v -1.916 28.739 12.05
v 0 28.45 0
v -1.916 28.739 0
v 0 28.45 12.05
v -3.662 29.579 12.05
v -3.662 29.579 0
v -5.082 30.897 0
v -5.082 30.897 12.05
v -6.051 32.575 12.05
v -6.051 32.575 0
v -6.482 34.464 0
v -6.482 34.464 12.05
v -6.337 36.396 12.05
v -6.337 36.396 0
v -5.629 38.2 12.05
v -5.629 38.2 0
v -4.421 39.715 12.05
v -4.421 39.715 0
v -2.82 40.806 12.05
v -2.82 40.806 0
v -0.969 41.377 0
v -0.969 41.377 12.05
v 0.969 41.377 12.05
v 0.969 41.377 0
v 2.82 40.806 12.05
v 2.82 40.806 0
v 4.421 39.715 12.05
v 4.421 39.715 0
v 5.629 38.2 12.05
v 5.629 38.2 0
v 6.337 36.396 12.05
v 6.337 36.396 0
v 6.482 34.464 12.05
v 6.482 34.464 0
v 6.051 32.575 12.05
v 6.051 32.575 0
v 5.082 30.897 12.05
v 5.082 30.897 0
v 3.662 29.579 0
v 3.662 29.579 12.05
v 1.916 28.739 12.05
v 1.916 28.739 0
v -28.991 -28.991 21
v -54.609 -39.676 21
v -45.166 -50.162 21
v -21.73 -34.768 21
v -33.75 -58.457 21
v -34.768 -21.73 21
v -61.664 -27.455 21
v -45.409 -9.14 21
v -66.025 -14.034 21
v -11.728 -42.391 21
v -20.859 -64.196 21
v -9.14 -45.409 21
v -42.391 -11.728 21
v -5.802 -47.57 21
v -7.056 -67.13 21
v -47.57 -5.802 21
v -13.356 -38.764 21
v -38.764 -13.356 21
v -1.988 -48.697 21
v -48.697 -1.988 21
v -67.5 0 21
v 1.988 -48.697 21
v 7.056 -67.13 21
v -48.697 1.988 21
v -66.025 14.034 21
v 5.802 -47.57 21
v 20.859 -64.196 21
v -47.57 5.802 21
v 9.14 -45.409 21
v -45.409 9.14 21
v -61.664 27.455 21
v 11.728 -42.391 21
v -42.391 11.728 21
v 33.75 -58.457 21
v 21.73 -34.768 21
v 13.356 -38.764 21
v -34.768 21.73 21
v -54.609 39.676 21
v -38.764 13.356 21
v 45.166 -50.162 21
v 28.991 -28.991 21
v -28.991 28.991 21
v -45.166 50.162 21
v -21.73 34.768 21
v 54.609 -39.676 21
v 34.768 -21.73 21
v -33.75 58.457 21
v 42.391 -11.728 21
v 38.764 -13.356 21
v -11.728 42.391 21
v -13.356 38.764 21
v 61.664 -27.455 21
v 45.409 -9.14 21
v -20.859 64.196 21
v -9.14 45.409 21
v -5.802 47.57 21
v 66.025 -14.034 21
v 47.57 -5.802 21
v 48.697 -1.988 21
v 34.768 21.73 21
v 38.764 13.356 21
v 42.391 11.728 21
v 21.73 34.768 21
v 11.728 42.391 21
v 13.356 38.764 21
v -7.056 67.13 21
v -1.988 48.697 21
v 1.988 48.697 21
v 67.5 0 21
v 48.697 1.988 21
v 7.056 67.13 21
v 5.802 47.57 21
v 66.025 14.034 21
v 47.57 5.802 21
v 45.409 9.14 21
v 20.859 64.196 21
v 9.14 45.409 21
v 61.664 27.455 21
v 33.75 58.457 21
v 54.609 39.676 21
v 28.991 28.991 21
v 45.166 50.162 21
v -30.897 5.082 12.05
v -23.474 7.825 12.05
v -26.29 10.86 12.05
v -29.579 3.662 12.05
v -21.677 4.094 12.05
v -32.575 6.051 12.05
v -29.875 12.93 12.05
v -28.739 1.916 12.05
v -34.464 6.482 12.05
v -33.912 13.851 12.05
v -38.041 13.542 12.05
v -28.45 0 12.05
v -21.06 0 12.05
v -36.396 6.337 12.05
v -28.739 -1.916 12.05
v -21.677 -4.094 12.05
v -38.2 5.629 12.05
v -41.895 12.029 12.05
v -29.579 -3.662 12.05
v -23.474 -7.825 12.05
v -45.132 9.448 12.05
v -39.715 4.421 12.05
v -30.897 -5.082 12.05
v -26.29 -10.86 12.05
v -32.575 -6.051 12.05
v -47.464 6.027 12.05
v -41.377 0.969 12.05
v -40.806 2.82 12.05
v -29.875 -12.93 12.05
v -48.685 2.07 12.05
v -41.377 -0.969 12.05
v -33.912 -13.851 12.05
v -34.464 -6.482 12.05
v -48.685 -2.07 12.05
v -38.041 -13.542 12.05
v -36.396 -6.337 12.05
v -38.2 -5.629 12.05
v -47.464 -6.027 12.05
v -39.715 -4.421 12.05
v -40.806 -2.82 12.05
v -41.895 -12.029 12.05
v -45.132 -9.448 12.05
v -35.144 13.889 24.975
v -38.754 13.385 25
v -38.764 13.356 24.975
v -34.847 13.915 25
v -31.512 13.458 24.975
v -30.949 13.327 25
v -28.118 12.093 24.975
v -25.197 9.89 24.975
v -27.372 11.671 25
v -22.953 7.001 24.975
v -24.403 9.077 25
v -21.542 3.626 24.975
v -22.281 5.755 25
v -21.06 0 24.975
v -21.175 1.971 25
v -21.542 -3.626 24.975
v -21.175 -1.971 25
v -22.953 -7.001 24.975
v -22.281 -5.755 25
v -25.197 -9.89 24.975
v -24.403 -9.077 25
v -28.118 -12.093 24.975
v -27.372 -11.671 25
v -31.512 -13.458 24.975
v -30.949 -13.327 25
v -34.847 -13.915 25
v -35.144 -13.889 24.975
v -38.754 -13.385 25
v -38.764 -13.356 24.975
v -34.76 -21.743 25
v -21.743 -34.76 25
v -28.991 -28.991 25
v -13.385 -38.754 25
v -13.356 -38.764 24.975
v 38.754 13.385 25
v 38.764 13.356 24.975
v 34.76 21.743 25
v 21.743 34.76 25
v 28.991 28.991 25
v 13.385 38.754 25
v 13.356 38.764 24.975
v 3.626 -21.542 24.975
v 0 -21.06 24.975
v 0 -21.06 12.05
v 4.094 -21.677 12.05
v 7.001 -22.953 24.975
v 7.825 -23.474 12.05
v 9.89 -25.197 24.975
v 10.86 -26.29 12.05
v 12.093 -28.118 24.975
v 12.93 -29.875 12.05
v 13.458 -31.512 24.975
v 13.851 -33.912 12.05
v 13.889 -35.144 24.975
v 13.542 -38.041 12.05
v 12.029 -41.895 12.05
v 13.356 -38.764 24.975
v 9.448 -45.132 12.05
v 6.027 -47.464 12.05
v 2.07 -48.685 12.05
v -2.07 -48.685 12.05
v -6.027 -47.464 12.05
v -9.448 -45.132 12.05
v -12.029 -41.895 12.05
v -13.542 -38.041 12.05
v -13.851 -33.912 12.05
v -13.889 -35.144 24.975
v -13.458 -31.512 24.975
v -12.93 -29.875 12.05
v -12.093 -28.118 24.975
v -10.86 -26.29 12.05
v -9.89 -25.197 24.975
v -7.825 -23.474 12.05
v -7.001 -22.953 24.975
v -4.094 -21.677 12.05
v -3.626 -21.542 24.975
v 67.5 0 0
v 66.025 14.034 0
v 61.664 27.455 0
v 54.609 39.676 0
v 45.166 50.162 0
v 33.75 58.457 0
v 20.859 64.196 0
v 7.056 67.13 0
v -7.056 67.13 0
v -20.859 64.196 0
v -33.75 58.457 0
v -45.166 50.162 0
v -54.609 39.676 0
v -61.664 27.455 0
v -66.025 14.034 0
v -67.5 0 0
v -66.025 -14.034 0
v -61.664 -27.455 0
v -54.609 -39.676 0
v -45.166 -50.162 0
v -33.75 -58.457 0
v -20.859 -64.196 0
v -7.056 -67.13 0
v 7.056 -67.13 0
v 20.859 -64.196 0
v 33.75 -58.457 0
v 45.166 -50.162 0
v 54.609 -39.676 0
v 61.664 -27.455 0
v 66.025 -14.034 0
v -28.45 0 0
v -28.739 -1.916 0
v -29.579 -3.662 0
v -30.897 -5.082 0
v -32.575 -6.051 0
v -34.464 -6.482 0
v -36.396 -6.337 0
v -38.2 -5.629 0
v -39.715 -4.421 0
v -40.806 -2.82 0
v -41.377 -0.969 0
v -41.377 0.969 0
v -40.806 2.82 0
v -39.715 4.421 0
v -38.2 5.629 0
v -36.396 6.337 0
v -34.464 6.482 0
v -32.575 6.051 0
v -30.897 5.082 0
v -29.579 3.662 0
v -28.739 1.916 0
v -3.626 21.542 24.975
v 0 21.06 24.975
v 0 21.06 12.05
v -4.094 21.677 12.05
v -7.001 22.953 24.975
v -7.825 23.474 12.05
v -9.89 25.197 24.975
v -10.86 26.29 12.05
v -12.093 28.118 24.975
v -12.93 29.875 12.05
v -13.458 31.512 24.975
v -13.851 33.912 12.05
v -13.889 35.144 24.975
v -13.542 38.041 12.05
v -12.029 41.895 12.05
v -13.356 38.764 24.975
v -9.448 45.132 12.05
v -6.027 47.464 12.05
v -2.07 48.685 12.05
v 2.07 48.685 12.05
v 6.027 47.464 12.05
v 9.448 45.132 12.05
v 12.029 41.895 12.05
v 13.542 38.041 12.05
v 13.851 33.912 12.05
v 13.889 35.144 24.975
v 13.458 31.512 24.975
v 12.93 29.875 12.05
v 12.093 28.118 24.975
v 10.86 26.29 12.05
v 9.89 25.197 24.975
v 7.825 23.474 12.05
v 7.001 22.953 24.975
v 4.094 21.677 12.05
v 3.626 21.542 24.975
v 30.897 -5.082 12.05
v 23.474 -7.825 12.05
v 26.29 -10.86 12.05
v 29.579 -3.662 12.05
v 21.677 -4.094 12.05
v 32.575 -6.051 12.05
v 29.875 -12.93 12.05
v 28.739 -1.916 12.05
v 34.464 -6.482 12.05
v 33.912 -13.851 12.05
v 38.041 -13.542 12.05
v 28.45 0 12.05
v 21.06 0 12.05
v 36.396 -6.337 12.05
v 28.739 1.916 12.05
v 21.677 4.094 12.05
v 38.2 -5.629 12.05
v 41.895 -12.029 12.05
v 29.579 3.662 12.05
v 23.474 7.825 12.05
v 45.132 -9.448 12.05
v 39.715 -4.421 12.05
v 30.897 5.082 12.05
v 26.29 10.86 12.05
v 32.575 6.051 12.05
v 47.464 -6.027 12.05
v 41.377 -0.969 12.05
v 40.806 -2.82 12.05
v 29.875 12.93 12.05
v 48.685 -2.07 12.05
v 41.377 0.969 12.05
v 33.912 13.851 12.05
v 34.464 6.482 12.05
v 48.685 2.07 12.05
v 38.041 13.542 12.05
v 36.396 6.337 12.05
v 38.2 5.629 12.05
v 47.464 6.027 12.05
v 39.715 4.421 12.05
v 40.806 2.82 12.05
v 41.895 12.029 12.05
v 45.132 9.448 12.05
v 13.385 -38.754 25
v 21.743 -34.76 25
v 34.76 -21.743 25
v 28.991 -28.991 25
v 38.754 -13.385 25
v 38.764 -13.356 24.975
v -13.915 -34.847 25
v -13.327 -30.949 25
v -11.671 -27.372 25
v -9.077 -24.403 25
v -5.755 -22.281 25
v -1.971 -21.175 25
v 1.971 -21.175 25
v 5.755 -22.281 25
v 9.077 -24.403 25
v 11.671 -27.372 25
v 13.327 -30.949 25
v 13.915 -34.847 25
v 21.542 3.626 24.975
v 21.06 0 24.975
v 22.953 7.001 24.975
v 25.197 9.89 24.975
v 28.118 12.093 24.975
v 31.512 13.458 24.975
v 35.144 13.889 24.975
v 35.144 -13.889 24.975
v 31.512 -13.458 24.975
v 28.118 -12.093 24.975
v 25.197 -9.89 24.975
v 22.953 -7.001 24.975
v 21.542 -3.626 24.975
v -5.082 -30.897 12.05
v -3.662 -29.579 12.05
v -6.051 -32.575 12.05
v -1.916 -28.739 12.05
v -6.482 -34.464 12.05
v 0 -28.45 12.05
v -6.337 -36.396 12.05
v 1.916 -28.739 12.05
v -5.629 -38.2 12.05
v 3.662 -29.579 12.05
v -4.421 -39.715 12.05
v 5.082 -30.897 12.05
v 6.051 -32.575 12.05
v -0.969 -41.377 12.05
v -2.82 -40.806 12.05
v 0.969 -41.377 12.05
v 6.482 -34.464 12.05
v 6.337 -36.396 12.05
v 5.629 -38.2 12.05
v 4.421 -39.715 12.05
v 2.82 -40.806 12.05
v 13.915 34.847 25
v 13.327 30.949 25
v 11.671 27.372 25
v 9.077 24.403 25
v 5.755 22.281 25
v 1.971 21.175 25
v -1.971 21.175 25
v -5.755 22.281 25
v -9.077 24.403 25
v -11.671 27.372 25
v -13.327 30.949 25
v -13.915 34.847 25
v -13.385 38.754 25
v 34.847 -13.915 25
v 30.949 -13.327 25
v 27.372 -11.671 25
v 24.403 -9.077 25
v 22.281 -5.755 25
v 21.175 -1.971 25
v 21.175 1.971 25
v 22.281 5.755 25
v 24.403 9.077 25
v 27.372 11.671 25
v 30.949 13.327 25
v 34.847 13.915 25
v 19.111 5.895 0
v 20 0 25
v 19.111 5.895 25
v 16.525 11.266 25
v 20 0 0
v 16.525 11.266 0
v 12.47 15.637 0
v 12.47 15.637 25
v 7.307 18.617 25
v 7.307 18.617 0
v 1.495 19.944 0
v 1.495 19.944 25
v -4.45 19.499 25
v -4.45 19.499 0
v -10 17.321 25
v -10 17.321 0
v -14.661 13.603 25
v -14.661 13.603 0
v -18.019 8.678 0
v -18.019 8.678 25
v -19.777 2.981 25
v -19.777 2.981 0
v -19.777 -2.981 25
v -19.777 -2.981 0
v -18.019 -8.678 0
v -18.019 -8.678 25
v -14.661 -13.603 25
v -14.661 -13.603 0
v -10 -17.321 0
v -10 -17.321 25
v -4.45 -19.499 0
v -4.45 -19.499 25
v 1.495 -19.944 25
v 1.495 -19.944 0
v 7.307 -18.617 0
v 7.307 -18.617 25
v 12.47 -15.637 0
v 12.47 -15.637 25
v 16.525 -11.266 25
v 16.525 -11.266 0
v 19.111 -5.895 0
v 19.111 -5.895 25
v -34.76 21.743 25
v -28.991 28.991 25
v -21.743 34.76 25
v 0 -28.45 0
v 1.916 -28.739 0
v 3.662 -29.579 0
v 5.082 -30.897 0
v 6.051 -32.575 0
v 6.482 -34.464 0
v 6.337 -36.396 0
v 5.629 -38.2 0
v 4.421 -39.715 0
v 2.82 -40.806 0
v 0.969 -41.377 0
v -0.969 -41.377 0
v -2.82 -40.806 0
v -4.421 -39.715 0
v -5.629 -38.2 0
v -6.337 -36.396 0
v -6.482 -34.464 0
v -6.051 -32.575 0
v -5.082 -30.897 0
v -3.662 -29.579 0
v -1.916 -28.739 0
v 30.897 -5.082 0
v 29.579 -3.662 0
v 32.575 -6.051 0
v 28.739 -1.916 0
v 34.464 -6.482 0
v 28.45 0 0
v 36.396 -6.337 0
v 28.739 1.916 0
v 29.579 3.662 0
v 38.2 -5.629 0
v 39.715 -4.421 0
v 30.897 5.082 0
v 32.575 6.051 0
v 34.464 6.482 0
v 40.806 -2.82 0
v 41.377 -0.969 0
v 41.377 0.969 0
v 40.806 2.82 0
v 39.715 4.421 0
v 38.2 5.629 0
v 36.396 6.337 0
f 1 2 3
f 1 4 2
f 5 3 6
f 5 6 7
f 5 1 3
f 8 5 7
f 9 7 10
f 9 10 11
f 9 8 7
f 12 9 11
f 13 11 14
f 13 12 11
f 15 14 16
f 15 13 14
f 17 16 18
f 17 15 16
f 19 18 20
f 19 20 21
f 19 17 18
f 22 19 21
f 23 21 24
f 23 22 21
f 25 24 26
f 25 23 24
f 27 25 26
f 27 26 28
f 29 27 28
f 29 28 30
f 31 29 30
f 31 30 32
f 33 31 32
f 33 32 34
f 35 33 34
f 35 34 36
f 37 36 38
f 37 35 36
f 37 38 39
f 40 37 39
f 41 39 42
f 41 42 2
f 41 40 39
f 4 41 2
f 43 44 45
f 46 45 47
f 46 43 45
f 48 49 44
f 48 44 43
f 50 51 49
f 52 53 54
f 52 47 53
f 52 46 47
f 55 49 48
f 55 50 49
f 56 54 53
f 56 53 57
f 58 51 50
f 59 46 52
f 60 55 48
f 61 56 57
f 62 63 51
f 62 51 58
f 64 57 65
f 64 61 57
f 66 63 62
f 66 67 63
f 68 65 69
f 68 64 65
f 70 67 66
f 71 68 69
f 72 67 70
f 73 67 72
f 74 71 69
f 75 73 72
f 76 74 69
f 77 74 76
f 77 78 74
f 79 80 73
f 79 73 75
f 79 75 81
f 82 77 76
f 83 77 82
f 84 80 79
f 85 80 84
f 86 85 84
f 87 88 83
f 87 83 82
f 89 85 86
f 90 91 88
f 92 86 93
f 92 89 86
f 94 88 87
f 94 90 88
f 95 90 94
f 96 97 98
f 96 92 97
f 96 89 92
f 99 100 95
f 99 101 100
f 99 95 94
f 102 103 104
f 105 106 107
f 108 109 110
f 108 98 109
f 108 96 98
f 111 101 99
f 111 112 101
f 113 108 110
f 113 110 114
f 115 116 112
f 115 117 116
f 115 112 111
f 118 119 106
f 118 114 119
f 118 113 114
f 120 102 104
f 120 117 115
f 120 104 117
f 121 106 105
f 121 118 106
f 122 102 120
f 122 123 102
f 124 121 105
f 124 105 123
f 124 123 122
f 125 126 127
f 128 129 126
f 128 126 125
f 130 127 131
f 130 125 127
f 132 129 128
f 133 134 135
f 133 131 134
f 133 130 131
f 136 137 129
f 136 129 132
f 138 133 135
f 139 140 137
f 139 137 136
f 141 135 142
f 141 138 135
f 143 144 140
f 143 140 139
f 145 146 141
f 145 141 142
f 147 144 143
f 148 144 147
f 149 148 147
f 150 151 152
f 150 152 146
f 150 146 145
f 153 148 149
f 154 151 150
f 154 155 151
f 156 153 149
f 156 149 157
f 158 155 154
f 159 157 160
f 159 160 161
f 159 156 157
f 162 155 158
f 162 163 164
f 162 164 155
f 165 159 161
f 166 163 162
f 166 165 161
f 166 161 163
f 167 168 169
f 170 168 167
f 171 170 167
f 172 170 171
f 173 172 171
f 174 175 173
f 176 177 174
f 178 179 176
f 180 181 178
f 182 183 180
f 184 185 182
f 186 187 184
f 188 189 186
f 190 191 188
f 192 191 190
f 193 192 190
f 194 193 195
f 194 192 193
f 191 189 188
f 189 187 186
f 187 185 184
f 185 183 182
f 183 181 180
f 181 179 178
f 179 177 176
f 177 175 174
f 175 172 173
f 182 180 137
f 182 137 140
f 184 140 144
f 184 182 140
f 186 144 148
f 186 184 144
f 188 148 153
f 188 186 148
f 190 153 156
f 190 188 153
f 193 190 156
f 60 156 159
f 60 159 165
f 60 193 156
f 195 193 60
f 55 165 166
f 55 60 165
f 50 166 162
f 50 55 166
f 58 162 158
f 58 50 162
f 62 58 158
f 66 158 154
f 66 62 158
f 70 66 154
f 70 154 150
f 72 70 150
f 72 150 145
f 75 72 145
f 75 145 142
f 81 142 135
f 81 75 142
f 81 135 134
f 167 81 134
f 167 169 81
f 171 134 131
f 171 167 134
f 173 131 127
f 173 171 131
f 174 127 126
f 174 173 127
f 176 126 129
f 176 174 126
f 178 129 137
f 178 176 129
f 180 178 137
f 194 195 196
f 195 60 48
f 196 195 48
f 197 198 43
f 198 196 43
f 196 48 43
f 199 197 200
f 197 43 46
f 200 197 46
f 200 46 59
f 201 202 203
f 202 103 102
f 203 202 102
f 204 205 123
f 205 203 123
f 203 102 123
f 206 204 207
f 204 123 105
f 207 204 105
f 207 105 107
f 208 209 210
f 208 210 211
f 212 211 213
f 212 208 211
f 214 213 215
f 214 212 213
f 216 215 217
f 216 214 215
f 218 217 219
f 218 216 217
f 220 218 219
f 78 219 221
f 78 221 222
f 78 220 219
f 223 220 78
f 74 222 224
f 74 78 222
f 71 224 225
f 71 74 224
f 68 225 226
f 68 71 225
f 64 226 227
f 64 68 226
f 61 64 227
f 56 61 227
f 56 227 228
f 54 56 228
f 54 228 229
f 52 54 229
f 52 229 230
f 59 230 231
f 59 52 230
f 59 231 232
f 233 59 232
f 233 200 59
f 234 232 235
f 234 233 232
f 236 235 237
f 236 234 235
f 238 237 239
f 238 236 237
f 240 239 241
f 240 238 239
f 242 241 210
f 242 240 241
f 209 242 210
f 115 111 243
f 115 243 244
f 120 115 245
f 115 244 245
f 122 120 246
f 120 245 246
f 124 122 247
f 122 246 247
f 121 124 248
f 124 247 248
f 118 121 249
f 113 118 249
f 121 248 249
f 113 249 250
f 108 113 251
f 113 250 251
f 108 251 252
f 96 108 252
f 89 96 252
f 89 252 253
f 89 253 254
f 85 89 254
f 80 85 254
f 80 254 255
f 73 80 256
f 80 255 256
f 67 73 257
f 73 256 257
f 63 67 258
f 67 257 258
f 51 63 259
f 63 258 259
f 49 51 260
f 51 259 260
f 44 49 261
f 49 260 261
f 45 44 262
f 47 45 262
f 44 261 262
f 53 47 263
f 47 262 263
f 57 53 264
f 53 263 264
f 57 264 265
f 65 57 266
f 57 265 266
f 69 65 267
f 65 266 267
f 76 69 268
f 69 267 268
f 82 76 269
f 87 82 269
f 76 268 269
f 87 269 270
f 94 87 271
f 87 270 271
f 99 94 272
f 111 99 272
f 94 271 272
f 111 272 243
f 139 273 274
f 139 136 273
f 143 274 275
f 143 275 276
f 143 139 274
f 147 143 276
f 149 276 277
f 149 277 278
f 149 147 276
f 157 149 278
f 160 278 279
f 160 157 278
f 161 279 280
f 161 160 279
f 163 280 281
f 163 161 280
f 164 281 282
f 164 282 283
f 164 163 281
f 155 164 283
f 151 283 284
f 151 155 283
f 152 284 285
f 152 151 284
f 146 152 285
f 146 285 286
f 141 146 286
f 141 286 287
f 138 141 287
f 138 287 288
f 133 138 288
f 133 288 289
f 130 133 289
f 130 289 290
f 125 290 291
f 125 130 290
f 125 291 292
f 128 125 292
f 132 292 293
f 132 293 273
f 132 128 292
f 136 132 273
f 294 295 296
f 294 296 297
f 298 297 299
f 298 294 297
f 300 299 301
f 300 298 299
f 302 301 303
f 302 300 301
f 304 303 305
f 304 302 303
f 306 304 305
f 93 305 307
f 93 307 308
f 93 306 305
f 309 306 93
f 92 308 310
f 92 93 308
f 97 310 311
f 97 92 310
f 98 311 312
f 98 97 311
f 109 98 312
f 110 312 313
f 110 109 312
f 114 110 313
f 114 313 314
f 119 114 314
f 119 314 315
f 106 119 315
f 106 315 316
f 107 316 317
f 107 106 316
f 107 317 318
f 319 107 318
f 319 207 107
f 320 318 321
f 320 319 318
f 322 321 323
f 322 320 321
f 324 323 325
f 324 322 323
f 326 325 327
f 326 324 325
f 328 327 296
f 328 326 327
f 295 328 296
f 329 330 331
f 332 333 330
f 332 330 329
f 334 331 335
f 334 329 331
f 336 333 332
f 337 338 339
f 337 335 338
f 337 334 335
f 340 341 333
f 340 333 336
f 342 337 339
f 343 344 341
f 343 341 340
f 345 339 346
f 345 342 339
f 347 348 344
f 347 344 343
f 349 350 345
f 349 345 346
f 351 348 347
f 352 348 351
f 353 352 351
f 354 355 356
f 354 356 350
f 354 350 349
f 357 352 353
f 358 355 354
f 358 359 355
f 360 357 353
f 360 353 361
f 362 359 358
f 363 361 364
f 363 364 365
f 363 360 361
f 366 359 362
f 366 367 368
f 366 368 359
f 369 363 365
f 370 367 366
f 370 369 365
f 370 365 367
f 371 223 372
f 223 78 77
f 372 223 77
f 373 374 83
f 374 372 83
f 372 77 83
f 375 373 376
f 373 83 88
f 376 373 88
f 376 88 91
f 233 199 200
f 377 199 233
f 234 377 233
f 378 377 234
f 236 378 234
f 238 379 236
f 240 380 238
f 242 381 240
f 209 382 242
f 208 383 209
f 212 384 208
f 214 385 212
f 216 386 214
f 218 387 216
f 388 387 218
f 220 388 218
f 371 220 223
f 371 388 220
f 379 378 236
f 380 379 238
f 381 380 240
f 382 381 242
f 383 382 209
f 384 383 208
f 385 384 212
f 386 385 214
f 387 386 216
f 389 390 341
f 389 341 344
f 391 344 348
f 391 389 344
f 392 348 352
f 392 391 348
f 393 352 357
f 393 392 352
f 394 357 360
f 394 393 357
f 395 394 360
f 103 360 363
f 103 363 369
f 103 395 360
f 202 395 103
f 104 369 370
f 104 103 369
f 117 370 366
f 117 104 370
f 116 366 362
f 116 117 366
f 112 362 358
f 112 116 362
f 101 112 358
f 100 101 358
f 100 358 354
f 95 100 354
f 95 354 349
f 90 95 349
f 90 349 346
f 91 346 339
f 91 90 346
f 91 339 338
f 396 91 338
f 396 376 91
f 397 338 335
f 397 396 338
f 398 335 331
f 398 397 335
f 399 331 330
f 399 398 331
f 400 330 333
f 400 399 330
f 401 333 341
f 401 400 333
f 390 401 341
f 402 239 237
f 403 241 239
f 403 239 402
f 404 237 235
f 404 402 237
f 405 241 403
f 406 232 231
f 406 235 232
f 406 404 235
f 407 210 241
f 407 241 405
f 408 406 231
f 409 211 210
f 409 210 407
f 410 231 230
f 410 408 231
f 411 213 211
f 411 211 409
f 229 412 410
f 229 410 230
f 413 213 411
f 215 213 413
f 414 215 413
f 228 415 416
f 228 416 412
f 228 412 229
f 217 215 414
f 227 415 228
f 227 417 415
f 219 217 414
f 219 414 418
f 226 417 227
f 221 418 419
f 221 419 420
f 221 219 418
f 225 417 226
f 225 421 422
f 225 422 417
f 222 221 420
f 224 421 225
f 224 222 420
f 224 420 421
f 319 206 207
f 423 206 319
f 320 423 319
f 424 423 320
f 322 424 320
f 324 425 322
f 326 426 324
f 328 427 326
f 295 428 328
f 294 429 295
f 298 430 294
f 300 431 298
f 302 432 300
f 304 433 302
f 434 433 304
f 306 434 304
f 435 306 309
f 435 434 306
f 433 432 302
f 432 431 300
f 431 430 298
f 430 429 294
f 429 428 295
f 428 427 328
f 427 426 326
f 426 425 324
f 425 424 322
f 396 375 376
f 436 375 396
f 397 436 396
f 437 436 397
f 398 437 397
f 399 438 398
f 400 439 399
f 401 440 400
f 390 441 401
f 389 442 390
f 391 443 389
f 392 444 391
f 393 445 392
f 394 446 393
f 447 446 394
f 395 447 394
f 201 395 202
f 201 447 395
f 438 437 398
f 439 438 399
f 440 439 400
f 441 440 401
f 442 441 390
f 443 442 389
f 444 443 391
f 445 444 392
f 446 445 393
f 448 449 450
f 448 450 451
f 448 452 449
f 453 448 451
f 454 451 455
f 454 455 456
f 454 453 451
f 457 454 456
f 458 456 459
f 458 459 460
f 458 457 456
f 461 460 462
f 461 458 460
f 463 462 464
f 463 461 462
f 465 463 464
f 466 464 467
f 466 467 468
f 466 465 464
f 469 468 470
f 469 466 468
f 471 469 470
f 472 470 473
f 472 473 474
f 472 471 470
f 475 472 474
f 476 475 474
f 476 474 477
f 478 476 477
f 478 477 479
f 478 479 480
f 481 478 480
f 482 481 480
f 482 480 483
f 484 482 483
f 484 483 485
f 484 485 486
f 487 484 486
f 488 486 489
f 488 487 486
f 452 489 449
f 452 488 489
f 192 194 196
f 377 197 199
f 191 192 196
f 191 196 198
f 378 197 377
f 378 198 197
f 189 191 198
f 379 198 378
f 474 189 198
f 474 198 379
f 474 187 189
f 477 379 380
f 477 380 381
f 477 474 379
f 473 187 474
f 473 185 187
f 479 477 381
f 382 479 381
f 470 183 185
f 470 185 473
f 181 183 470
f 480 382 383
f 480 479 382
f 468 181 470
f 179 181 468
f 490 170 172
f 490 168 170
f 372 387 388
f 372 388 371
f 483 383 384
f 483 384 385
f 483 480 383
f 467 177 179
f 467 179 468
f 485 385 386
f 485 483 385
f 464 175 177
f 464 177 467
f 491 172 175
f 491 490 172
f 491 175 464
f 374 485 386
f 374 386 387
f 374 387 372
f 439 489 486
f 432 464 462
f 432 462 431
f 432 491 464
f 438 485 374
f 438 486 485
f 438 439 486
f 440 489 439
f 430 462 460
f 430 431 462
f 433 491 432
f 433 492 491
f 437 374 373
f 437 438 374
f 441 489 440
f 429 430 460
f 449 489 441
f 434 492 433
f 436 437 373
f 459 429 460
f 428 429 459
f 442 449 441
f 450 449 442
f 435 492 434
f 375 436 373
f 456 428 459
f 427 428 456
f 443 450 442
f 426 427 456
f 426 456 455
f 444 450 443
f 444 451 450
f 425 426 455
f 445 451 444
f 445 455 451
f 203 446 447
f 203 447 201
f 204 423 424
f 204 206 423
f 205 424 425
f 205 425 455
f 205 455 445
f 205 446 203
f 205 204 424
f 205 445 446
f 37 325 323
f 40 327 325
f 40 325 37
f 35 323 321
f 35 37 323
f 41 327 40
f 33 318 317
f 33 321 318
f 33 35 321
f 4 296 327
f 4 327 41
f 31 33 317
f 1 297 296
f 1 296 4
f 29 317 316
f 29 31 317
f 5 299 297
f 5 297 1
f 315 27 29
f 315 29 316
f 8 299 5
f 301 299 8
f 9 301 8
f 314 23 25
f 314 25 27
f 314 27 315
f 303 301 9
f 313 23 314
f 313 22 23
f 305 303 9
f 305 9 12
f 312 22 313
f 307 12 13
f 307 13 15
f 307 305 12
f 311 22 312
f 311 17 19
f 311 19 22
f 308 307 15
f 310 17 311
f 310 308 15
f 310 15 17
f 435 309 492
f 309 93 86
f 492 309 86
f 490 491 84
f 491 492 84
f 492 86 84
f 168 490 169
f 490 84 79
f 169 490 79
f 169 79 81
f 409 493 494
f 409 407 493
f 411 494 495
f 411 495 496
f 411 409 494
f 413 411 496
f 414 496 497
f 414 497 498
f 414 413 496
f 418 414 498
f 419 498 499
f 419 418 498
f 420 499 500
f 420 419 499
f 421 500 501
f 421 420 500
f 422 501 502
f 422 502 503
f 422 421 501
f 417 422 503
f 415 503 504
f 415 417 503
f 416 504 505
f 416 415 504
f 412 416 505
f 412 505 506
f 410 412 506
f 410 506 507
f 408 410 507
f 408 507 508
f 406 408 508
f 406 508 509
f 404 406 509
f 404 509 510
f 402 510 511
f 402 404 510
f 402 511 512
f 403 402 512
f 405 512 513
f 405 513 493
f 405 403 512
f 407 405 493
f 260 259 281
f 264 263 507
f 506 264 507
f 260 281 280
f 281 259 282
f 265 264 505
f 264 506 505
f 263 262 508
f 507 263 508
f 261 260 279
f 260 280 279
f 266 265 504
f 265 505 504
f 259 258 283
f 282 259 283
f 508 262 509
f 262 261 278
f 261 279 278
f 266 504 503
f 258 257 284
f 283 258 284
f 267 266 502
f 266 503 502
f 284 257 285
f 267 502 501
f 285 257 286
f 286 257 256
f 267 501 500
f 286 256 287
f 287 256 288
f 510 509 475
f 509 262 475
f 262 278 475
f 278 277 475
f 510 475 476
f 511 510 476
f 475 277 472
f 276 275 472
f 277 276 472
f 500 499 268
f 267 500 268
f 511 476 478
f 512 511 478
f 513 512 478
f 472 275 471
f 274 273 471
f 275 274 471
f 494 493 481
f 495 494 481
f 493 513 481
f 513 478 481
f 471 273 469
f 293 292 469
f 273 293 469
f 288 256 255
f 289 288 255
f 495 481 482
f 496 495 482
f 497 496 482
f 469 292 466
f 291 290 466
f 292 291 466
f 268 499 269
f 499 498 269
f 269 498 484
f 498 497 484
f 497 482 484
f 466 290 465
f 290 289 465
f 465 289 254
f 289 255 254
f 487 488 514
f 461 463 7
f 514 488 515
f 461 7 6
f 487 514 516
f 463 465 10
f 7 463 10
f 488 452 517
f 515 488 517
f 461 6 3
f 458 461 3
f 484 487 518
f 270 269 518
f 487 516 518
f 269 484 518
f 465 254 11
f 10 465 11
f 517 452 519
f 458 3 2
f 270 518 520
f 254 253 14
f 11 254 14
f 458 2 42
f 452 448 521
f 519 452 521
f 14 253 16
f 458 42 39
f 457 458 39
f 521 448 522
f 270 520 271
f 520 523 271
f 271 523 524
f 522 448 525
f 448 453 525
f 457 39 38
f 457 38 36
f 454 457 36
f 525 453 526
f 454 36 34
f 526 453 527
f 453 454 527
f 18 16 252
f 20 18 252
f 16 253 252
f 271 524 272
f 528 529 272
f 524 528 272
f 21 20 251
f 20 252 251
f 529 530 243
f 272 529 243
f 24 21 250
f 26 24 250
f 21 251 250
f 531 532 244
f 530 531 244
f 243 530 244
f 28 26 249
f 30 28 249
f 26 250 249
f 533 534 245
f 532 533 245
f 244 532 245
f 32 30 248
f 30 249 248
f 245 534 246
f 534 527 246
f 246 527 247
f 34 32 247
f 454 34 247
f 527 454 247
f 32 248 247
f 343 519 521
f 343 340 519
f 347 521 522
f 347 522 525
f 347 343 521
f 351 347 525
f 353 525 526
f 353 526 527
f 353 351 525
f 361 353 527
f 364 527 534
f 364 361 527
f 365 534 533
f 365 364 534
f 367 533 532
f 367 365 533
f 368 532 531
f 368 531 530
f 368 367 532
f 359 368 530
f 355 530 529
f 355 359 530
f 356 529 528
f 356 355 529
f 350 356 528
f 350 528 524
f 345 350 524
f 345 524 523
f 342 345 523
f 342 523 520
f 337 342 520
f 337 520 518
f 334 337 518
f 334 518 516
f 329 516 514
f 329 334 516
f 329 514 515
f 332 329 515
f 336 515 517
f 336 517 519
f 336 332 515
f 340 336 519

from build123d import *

# Parameters (mm, degrees)
CROQUIS1_R              = 67.5
CROQUIS1_R_2            = 20
SALIENTE_EXTRUIR1_DEPTH = 21
CROQUIS2_R              = 41
CROQUIS2_R_2            = 20
SALIENTE_EXTRUIR2_DEPTH = 4
MATRIZC1_COUNT          = 4


with BuildPart() as part:
    # Croquis1 → Saliente-Extruir1 (new body)
    with BuildSketch(Plane.XY):
        Circle(CROQUIS1_R)
        Circle(CROQUIS1_R_2, mode=Mode.SUBTRACT)
    extrude(amount=SALIENTE_EXTRUIR1_DEPTH)

    # Croquis2 → Saliente-Extruir2 (add)
    with BuildSketch(Plane.XY.offset(21)):
        Circle(CROQUIS2_R)
        Circle(CROQUIS2_R_2, mode=Mode.SUBTRACT)
    extrude(amount=SALIENTE_EXTRUIR2_DEPTH)

    # Croquis7 → Refrentado para perno con cabeza hexagonal de M122 (revolve, cut)
    with BuildSketch(Plane(origin=(0, 34.95, 25), x_dir=(0, -1, 0), z_dir=(1, 0, 0))):
        Polygon((0, 0), (0, 25), (6.5, 25), (6.5, 12.95), (13.89, 12.95), (13.89, 0.025), (13.915, 0), align=None)
    refrentado_para_perno_con_cabeza_hexagon = revolve(axis=Axis((0, 34.95, 31.35), (0, 0, -1)), mode=Mode.SUBTRACT)

    # MatrizC1: Refrentado para perno con cabeza hexagonal de M122 ×4 about axis
    matrizc1_axis = Axis((0, 0, 0), (0, 0, 1))
    for i in range(1, MATRIZC1_COUNT):
        add(refrentado_para_perno_con_cabeza_hexagon.rotate(matrizc1_axis, i * 360 / MATRIZC1_COUNT), mode=Mode.SUBTRACT)


solid = part.part
